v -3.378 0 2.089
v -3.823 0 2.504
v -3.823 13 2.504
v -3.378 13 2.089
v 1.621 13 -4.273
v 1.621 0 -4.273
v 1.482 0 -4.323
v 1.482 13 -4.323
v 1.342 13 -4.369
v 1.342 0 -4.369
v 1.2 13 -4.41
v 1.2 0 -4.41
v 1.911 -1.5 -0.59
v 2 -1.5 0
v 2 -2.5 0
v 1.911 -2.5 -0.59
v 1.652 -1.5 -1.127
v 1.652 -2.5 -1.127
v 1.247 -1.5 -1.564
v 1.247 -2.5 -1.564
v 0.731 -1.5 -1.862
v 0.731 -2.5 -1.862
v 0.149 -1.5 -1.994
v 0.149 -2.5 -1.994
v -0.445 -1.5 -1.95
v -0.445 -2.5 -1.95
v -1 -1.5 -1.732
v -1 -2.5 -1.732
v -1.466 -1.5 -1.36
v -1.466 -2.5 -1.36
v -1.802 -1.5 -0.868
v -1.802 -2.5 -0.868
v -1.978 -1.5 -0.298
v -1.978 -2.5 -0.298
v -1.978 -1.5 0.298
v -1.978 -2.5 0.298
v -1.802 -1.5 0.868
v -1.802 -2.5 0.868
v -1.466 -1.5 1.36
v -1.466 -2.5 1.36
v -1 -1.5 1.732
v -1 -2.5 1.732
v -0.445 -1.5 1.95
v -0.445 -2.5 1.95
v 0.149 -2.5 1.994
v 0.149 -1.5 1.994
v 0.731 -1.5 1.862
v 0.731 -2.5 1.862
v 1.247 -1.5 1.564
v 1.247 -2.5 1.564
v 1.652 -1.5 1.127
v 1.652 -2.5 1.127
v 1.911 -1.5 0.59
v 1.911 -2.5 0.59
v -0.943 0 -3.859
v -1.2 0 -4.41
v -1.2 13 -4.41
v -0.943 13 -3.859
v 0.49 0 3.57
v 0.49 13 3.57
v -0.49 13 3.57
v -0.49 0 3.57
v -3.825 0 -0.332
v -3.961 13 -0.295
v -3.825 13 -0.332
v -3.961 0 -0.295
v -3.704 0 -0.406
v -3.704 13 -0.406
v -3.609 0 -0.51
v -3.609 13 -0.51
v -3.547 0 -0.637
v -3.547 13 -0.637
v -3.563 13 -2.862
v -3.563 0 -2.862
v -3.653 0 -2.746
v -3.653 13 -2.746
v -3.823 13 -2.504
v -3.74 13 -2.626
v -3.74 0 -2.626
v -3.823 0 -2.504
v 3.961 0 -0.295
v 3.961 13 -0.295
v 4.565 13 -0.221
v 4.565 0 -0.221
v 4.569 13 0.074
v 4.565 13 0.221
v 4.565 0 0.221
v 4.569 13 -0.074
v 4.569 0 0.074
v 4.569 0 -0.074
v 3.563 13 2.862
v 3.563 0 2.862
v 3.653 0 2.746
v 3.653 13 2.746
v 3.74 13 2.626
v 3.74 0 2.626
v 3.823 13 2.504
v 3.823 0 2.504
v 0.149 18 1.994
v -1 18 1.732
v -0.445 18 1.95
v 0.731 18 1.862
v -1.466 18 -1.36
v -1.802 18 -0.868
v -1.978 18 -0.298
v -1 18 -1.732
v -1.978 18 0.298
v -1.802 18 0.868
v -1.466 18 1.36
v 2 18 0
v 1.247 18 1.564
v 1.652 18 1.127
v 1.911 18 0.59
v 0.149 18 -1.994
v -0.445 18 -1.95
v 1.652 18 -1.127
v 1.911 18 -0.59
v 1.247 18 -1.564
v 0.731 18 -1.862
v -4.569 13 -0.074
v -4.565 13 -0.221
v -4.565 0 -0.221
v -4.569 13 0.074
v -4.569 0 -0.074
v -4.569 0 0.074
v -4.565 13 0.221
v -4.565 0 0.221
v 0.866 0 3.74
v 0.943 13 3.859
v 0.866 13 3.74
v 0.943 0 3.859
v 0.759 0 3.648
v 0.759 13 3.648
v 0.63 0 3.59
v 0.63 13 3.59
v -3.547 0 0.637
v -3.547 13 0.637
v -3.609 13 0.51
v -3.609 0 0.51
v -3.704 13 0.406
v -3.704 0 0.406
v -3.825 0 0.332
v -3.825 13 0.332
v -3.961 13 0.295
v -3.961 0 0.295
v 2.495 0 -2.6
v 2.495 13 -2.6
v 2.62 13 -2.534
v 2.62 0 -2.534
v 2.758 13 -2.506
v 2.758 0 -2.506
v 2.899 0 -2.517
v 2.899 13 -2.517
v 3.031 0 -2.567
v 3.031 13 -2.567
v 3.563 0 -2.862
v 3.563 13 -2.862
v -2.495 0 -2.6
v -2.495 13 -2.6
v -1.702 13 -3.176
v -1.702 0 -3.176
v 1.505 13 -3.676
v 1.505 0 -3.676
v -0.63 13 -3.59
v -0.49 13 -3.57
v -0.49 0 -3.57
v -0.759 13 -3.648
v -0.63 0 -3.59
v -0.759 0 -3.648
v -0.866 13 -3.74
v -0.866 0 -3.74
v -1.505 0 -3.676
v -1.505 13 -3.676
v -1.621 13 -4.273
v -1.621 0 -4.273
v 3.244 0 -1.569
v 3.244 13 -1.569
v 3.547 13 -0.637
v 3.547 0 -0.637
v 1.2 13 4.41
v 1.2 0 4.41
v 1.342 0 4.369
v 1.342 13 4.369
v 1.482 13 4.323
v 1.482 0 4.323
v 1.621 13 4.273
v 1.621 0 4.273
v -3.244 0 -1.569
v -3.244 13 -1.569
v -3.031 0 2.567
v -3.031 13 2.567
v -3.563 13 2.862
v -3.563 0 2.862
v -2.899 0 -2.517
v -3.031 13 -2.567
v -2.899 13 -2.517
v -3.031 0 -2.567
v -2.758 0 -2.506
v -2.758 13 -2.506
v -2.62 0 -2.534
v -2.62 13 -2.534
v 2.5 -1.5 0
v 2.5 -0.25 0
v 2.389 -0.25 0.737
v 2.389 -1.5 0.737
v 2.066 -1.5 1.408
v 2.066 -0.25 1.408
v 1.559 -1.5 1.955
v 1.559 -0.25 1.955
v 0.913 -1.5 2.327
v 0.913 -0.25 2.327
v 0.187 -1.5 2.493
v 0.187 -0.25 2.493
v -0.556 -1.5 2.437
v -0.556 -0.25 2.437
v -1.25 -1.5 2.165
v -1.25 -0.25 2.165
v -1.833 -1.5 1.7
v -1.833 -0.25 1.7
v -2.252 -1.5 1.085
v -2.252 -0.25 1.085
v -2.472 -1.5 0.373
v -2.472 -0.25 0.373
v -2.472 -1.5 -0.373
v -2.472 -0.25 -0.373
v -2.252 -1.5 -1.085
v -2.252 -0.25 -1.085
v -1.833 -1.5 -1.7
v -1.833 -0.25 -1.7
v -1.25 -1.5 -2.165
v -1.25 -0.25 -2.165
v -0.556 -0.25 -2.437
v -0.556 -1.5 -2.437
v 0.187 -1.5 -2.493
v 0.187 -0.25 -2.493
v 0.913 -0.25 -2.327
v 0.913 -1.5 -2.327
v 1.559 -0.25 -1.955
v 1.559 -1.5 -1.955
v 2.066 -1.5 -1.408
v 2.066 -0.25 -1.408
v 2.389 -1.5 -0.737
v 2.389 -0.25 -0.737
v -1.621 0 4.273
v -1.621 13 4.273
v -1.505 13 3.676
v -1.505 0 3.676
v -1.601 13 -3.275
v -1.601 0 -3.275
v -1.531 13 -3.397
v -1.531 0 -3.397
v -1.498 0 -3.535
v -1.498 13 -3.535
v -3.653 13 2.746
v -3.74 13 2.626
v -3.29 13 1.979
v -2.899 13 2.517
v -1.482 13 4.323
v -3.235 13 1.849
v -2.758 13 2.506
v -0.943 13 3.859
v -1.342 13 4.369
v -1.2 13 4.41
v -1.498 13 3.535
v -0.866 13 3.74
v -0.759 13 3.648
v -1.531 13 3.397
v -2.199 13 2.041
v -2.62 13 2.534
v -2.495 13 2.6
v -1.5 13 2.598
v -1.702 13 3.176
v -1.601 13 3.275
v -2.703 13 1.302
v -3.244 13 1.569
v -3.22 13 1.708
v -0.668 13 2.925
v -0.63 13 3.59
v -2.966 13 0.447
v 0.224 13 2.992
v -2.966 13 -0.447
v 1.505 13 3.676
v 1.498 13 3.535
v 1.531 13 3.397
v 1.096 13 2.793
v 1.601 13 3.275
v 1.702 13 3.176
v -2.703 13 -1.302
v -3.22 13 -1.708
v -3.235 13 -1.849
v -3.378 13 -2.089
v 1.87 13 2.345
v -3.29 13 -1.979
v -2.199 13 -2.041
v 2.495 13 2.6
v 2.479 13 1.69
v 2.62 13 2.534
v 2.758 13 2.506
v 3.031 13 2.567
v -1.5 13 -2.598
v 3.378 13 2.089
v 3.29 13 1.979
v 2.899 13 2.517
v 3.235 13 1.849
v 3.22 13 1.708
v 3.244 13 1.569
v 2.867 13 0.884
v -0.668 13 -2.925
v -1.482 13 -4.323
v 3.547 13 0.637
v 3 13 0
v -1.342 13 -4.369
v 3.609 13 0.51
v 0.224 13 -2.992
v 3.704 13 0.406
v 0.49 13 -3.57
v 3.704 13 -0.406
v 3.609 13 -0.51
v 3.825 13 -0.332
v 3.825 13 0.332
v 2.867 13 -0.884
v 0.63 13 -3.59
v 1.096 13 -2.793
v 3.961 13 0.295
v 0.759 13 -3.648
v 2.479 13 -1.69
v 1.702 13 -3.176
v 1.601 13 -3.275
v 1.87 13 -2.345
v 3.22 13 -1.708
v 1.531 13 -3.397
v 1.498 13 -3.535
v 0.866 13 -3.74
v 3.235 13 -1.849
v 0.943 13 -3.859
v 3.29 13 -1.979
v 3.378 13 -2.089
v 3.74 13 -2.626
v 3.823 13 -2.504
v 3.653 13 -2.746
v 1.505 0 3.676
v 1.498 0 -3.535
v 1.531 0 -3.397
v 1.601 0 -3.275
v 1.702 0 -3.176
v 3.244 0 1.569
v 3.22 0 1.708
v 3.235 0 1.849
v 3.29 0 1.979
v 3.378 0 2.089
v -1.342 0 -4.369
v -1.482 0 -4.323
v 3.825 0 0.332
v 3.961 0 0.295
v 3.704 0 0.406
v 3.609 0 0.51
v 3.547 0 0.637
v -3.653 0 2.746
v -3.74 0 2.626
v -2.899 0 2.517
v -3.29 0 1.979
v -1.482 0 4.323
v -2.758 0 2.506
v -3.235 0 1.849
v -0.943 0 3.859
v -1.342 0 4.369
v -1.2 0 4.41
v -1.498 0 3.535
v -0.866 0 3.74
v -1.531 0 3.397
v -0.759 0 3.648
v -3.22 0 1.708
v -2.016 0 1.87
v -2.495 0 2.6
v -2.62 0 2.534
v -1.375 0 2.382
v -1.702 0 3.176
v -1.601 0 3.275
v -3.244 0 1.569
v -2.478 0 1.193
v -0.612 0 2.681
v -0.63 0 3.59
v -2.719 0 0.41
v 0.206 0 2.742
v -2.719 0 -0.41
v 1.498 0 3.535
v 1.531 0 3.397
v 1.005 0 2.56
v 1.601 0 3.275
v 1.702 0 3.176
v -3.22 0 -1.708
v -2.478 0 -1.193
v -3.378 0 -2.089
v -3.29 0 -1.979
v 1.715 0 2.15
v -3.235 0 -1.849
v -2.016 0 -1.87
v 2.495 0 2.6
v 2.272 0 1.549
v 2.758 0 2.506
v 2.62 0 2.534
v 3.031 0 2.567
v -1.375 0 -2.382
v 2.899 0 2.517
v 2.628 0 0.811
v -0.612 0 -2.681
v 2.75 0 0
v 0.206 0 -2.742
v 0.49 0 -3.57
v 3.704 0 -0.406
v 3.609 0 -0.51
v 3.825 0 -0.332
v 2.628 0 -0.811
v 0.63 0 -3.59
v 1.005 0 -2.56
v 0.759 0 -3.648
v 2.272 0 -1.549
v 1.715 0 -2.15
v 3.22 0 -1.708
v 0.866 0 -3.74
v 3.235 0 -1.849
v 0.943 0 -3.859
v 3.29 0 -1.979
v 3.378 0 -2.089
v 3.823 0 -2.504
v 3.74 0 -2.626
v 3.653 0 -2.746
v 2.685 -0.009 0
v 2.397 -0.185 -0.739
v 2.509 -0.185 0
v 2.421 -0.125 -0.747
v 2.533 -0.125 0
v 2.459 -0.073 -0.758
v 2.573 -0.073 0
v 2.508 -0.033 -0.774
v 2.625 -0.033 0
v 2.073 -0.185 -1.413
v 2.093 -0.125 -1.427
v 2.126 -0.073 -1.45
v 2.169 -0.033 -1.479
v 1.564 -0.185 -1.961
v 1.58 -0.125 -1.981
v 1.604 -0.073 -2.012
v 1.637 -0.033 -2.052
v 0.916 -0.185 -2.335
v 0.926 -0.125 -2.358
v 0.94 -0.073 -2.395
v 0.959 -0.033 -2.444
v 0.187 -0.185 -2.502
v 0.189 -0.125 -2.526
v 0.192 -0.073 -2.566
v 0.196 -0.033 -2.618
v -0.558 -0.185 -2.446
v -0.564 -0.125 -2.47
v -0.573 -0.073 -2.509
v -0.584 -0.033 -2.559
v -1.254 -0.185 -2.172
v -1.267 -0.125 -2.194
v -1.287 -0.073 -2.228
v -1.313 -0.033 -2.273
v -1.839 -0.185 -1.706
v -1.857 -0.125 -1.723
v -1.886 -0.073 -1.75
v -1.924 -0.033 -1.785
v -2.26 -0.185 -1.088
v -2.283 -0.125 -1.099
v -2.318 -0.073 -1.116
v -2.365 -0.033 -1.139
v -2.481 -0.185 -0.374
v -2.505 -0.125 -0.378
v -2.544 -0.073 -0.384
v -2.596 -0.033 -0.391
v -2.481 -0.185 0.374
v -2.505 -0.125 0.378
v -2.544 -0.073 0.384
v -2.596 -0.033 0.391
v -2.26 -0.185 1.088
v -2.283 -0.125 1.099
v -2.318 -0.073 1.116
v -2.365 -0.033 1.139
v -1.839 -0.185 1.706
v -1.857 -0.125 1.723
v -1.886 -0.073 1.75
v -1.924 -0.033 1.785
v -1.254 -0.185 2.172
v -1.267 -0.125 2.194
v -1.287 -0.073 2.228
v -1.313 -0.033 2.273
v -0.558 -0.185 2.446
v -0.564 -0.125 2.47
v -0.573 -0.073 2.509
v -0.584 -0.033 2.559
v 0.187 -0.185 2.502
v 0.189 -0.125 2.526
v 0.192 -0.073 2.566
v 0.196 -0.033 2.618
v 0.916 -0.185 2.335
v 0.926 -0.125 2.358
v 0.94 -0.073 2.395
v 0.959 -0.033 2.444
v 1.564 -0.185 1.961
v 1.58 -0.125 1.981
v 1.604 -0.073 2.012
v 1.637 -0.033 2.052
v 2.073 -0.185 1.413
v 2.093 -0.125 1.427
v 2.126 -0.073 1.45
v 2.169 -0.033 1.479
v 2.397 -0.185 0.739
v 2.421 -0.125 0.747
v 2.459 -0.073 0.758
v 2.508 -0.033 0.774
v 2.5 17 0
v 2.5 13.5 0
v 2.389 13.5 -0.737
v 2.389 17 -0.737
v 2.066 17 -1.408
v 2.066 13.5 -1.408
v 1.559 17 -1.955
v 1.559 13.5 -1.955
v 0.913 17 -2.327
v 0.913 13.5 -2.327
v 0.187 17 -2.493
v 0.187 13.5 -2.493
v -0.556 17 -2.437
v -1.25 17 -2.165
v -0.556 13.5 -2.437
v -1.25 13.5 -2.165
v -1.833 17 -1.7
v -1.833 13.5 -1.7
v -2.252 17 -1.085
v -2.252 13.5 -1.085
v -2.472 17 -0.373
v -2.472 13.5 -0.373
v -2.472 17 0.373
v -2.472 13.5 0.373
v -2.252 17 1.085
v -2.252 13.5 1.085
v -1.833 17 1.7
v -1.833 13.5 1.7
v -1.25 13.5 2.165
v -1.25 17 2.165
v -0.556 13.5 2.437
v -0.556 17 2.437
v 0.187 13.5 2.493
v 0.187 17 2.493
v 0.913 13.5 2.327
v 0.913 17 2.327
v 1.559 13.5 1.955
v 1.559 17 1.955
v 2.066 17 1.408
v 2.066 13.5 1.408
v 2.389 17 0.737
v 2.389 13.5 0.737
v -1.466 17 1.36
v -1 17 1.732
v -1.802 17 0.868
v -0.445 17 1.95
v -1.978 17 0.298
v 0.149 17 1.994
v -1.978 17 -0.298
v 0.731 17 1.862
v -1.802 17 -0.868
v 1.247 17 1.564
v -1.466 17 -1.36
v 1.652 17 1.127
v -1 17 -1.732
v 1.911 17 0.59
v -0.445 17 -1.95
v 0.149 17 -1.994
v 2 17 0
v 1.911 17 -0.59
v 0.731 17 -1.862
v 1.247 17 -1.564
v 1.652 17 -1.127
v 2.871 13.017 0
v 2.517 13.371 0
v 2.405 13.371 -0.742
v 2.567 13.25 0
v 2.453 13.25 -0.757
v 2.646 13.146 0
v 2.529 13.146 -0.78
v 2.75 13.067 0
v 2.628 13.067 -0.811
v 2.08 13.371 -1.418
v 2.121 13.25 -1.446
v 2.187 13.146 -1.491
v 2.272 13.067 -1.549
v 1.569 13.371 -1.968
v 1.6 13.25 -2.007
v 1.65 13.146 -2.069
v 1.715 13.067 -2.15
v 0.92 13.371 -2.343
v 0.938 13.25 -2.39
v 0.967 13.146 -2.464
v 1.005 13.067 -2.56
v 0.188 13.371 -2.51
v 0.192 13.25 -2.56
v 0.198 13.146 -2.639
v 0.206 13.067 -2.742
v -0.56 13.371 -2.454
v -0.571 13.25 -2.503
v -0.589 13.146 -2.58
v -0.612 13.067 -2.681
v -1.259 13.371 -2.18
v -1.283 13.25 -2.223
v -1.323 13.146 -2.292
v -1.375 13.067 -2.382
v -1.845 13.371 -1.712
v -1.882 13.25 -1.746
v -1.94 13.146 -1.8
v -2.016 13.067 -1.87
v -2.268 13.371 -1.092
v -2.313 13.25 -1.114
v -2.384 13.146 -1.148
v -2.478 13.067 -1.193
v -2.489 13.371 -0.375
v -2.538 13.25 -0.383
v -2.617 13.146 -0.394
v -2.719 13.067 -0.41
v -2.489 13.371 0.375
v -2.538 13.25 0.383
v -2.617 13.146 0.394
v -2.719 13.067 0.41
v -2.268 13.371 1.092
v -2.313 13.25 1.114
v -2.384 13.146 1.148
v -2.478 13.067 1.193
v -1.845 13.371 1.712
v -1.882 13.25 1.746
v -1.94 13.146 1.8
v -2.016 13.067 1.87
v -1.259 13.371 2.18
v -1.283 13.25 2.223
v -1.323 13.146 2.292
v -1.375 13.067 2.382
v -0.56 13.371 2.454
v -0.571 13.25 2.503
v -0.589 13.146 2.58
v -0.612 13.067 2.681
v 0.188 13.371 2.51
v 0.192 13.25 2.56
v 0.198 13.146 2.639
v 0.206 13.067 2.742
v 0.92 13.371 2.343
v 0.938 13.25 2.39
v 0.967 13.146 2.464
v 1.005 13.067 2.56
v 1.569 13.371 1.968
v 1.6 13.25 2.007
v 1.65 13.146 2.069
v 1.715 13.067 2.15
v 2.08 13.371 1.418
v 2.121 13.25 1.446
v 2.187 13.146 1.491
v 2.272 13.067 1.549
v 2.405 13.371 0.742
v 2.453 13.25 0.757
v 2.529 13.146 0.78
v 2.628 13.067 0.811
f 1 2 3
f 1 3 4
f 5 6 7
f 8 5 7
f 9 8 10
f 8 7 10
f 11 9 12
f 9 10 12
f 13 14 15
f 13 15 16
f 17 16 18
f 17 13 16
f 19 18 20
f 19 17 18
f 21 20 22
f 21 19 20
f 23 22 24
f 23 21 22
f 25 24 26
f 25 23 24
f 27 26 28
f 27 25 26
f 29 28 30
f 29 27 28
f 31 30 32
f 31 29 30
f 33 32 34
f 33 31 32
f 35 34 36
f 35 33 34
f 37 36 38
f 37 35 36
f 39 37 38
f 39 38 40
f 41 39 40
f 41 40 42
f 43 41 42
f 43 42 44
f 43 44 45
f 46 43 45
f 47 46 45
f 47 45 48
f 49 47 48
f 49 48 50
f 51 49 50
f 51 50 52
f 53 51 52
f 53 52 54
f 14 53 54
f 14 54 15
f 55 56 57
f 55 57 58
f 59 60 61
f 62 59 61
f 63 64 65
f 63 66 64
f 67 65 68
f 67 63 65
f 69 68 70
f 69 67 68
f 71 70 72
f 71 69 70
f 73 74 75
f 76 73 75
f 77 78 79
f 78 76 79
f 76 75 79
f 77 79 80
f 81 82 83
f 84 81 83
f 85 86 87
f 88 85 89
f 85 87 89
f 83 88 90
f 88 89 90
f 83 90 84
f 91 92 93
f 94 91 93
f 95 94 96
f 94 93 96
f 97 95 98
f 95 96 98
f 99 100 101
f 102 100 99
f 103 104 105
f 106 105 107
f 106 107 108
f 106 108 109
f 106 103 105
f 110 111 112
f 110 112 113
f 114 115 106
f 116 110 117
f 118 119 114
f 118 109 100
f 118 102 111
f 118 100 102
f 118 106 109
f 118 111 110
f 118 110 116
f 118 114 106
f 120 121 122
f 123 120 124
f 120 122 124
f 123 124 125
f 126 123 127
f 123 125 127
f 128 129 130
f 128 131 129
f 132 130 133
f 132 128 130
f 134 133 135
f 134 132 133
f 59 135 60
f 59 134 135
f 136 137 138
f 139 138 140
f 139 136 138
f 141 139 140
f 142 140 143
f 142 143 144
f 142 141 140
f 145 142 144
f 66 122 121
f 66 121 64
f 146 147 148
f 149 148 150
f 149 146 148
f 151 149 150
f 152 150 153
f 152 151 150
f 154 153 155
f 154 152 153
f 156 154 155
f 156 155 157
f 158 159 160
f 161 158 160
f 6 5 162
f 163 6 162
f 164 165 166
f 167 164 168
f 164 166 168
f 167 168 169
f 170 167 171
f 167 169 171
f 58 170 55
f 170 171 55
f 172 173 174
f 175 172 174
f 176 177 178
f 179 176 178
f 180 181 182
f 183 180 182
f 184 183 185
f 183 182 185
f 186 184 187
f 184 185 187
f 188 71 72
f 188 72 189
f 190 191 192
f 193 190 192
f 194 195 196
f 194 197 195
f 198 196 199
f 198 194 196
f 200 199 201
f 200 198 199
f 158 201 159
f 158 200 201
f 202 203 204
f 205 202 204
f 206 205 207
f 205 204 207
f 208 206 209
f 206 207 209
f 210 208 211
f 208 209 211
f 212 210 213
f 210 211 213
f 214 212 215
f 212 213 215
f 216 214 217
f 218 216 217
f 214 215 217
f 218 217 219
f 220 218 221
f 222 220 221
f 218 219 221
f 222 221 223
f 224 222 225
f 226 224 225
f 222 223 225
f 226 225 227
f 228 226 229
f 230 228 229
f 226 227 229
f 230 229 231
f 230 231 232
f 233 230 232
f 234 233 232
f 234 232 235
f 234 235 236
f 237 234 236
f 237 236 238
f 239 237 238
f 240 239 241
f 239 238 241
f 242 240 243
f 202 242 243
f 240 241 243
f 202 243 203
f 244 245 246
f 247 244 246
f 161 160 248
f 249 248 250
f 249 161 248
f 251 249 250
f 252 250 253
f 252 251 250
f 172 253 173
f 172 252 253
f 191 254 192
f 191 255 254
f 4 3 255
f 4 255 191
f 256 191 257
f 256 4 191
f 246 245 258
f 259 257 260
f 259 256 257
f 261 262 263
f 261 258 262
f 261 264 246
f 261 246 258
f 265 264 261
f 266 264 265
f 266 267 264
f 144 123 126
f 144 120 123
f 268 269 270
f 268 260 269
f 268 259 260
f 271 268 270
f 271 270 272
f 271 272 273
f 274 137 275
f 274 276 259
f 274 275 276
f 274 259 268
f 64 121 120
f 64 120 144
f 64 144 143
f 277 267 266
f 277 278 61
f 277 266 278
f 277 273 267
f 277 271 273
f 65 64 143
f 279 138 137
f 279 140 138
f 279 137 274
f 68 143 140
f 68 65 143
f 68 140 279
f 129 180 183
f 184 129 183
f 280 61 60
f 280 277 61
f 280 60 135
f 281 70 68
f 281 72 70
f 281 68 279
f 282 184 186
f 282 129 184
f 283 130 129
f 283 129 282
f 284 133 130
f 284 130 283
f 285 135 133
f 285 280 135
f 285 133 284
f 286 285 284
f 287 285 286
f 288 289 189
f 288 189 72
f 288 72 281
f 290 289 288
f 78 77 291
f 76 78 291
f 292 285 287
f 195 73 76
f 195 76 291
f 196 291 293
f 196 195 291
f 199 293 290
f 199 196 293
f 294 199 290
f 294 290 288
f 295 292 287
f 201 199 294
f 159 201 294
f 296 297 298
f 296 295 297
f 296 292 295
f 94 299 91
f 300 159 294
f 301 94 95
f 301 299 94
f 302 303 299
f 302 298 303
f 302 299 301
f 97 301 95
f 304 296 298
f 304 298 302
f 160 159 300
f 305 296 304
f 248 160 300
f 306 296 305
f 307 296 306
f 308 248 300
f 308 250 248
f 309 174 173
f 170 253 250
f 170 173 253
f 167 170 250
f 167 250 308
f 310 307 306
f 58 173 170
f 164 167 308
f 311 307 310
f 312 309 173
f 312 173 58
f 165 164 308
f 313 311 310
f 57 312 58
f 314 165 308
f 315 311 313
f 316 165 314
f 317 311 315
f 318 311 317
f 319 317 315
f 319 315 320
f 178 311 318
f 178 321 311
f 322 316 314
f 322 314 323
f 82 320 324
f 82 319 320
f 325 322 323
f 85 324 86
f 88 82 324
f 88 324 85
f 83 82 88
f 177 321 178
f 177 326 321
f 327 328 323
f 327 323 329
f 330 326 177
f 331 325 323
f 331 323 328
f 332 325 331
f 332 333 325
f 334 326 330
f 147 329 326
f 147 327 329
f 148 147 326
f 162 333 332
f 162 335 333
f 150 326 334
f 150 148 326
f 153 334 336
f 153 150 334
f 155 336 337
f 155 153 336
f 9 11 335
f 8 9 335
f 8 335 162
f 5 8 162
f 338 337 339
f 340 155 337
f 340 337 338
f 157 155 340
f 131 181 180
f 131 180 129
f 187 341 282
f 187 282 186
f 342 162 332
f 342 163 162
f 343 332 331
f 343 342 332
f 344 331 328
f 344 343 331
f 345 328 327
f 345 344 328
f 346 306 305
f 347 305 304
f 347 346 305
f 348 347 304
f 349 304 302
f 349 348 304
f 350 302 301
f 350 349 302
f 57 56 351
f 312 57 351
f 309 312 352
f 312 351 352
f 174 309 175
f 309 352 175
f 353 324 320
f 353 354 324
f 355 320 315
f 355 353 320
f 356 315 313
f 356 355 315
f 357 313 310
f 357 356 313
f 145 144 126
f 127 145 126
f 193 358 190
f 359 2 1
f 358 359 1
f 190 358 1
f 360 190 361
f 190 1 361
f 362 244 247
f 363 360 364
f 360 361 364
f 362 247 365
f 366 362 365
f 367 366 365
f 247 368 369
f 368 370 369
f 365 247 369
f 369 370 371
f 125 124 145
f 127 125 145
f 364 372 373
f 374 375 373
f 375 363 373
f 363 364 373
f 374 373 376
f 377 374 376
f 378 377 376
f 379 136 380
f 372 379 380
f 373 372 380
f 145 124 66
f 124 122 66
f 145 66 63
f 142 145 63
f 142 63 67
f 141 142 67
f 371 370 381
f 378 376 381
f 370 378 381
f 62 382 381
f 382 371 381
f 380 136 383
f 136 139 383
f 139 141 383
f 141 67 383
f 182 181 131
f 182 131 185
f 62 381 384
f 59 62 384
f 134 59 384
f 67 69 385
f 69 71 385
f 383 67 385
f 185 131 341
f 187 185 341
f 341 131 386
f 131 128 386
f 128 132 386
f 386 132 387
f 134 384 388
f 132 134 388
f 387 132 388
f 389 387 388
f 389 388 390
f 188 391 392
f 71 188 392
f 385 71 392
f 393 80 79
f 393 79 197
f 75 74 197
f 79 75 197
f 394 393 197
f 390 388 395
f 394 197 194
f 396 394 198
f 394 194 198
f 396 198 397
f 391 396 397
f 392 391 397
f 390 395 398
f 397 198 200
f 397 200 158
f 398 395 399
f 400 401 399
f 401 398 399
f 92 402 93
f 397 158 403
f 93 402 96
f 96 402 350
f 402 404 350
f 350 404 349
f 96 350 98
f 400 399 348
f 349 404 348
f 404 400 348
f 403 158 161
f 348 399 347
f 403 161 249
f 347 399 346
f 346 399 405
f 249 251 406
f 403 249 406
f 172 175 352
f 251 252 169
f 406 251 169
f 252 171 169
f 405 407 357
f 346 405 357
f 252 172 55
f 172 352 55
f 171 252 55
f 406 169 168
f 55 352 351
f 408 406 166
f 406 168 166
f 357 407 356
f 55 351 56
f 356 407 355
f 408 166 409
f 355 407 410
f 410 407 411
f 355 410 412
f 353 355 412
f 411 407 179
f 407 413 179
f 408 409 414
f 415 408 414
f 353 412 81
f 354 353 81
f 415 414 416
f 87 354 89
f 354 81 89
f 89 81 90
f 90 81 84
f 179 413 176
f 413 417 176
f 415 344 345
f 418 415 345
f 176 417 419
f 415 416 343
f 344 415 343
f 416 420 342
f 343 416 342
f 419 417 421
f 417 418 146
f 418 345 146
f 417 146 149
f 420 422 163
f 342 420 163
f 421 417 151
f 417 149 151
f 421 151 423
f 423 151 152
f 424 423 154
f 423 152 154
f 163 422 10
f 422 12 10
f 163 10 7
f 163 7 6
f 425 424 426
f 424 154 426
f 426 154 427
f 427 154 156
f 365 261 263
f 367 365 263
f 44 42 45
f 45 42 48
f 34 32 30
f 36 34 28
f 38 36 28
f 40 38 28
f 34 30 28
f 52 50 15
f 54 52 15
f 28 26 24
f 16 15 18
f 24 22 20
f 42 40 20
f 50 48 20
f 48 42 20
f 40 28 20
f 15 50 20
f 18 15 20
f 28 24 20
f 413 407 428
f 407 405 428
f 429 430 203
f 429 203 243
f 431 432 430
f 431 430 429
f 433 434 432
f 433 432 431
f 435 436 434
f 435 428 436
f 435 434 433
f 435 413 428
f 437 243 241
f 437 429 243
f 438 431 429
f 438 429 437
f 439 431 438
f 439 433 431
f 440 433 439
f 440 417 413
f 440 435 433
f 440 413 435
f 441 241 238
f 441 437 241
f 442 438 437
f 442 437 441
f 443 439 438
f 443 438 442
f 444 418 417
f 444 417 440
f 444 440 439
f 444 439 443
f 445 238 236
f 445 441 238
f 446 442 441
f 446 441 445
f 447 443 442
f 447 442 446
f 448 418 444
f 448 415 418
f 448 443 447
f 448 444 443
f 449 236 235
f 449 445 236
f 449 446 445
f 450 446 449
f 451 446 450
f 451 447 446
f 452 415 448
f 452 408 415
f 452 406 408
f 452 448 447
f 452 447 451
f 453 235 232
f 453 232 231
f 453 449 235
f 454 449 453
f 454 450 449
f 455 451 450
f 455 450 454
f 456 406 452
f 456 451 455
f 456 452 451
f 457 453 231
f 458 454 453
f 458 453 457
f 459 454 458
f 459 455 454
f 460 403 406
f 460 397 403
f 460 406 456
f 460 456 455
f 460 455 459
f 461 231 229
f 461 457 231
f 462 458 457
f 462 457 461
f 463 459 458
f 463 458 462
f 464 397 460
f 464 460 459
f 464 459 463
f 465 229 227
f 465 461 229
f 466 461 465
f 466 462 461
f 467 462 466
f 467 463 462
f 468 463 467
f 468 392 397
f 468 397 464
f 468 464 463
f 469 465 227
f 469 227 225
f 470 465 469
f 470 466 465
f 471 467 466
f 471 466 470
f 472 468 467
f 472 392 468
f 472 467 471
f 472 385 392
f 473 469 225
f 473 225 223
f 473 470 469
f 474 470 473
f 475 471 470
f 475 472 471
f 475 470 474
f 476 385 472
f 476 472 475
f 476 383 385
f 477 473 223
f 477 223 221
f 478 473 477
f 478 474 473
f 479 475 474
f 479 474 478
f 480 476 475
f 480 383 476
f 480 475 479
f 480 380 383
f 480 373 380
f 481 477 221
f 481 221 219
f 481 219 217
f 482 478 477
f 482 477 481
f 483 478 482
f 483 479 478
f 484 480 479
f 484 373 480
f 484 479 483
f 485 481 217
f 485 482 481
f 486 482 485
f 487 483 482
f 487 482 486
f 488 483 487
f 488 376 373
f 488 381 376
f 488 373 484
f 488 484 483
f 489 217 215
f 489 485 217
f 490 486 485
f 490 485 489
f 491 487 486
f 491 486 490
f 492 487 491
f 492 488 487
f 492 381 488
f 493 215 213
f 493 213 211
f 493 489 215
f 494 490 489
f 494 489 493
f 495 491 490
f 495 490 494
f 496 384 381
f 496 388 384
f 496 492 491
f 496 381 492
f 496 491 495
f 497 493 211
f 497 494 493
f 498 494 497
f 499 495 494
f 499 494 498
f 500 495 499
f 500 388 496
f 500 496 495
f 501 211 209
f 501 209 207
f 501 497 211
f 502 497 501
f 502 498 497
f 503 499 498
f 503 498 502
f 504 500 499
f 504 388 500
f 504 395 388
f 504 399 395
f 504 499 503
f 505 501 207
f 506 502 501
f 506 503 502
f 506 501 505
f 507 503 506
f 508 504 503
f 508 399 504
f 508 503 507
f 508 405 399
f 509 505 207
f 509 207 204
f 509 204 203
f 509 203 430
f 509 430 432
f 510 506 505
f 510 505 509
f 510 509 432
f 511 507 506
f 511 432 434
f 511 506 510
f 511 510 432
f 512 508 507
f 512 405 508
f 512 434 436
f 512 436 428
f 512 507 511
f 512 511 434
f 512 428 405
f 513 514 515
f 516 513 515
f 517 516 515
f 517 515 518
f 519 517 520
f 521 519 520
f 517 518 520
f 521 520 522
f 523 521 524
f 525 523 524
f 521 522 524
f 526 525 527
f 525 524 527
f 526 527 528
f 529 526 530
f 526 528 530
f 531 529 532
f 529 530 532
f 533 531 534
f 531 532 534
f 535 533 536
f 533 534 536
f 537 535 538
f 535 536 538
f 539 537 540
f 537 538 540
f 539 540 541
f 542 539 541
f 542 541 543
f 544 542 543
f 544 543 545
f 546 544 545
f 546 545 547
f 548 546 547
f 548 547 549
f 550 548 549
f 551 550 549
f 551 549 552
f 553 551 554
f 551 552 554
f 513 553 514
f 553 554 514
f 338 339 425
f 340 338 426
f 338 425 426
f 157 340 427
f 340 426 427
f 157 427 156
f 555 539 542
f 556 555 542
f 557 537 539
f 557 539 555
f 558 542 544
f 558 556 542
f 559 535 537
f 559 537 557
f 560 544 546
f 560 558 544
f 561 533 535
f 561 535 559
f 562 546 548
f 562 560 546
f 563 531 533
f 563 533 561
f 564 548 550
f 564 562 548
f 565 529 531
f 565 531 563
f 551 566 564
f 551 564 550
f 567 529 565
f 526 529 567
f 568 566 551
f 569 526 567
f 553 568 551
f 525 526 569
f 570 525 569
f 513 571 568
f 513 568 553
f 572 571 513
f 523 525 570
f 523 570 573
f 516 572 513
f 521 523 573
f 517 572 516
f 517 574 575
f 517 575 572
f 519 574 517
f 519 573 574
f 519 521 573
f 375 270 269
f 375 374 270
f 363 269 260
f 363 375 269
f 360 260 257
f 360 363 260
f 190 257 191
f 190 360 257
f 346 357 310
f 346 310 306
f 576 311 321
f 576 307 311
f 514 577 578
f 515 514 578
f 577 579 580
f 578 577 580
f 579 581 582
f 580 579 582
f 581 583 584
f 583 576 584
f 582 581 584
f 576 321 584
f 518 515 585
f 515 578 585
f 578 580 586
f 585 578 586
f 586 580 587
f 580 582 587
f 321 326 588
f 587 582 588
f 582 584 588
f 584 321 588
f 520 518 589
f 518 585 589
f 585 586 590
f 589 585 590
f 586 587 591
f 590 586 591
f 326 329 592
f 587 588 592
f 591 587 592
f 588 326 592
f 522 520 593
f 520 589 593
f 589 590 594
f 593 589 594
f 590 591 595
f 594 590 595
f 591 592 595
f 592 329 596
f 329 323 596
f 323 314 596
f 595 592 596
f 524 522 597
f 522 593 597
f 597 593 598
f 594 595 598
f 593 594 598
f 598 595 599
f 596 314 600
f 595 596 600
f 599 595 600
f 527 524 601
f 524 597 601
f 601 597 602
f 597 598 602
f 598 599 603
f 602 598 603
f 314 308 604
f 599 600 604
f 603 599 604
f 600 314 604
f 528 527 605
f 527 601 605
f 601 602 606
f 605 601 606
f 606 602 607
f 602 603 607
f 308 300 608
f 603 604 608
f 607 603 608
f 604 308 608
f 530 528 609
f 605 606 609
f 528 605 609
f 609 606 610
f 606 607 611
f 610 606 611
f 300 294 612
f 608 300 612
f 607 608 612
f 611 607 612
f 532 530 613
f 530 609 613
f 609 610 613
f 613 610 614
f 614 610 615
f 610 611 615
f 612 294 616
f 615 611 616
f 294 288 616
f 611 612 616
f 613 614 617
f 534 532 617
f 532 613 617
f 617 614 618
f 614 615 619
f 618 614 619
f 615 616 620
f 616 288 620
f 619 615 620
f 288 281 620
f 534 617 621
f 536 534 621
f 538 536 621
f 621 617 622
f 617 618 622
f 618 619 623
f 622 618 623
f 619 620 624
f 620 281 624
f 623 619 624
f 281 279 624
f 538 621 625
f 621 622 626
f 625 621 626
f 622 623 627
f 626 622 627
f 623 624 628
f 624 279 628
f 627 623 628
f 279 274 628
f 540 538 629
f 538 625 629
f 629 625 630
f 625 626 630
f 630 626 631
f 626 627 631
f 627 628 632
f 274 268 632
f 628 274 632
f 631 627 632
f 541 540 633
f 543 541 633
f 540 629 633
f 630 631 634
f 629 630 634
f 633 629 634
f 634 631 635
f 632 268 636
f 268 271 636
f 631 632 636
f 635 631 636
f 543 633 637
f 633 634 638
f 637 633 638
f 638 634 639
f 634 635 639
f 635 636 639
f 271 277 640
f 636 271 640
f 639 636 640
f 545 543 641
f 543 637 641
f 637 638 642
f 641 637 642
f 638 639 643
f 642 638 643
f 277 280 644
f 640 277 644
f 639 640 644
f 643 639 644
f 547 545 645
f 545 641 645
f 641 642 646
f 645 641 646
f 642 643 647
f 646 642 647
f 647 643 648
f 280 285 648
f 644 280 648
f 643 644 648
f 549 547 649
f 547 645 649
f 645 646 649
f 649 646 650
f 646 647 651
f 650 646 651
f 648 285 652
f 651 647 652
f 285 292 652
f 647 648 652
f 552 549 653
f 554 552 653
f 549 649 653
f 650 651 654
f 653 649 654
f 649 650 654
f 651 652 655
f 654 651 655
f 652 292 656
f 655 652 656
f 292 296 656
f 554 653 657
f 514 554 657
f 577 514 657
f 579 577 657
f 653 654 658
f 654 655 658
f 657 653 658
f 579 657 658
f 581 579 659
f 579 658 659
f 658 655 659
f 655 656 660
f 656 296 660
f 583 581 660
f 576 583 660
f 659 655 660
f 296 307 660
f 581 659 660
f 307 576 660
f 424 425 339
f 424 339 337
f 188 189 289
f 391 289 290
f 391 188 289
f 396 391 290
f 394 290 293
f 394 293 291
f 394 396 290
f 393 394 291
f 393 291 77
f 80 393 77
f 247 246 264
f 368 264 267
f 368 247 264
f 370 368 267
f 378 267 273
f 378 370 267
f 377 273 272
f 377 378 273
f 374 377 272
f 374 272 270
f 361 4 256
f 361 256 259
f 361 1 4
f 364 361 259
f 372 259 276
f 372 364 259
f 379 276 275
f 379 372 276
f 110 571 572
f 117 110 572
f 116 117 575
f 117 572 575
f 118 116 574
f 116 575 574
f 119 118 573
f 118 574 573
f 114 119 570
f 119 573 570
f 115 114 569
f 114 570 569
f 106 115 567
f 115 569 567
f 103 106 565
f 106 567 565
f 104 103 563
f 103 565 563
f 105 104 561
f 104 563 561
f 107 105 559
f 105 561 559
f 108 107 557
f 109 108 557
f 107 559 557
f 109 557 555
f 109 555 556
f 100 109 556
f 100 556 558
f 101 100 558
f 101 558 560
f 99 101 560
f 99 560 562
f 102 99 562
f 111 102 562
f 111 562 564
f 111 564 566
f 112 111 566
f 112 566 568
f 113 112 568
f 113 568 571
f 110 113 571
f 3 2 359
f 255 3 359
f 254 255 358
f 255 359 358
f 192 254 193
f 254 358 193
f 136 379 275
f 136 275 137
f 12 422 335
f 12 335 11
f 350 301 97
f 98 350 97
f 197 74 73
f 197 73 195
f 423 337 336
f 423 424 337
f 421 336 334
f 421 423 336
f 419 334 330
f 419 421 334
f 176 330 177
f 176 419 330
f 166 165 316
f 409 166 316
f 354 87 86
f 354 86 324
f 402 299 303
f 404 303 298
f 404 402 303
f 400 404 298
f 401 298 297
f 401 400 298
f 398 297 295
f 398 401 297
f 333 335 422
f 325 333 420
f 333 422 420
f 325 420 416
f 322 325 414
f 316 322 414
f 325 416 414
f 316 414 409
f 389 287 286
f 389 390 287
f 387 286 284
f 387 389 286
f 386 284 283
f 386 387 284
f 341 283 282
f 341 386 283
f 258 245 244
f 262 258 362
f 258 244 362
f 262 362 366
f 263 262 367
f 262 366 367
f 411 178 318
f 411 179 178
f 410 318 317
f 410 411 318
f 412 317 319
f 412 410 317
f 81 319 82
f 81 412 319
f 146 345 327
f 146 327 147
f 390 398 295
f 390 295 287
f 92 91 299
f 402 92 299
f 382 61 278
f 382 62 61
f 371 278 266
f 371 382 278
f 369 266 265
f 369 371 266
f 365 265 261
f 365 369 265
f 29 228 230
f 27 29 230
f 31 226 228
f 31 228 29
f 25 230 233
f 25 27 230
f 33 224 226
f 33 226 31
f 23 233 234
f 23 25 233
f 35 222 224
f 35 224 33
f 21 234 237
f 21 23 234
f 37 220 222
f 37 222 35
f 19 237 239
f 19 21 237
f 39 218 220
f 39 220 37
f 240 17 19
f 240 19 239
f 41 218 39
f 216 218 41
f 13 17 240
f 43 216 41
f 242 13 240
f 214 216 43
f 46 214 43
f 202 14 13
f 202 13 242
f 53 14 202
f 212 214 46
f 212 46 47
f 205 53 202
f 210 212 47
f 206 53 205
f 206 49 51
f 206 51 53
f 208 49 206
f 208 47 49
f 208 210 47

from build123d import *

# Parameters (mm, degrees)
SKIZZE1_R                       = 4.57
SKIZZE1_R_2                     = 2
AUFSATZ_LINEAR_AUSTRAGEN1_DEPTH = 13
SCHNITT_LINEAR_AUSTRAGEN1_DEPTH = 14
VERRUNDUNG1_R                   = 0.5
KREISMUSTER1_COUNT              = 10
VERRUNDUNG1_OF_KREISMUSTER1_R   = 0.5
FASE2_SIZE                      = 0.2
BOSS_EXTRUDE1_DEPTH             = 6.3
BOSS_EXTRUDE1_DEPTH_BACK        = 6.3
SKETCH2_R                       = 2.2
BOSS_EXTRUDE4_DEPTH             = 13
SKETCH3_R                       = 2
BOSS_EXTRUDE6_DEPTH             = 5
BOSS_EXTRUDE6_DEPTH_BACK        = 15.5
FILLET2_R                       = 0.5
SKETCH4_R                       = 2.5
SKETCH4_R_2                     = 1.5
BOSS_EXTRUDE7_DEPTH             = 1.5
FILLET3_R                       = 0.25
SKETCH5_R                       = 2.5
SKETCH5_R_2                     = 1.5
BOSS_EXTRUDE8_DEPTH             = 4
FILLET4_R                       = 0.5


with BuildPart() as part:
    # Skizze1 → Aufsatz-Linear austragen1 (new body)
    with BuildSketch(Plane(origin=(0, 0, 0), x_dir=(1, 0, 0), z_dir=(0, 1, 0))):
        Circle(SKIZZE1_R)
        Circle(SKIZZE1_R_2, mode=Mode.SUBTRACT)
    extrude(amount=AUFSATZ_LINEAR_AUSTRAGEN1_DEPTH)

    # Skizze12 → Schnitt-Linear austragen1 (cut, through all)
    with BuildSketch(Plane(origin=(0, 13, 0), x_dir=(1, 0, 0), z_dir=(0, 1, 0))):
        with BuildLine():
            Line((-1.2, 4.409637173), (-0.808470756, 3.57))
            Line((-0.808470756, 3.57), (0.808470756, 3.57))
            Line((0.808470756, 3.57), (1.2, 4.409637173))
            ThreePointArc((1.2, 4.409637173), (0, 4.57), (-1.2, 4.409637173))
        make_face()
    schnitt_linear_austragen1 = extrude(amount=-SCHNITT_LINEAR_AUSTRAGEN1_DEPTH, mode=Mode.SUBTRACT)

    # Verrundung1
    verrundung1_edges = [part.edges().sort_by_distance(p)[0] for p in [
        (0.808470756, 6.5, -3.57),
        (-0.808470756, 6.5, -3.57),
    ]]
    fillet(verrundung1_edges, radius=VERRUNDUNG1_R)

    # Kreismuster1: Schnitt-Linear austragen1 ×10 about axis
    kreismuster1_axis = Axis((0, 0, 0), (0, 1, 0))
    for i in range(1, KREISMUSTER1_COUNT):
        add(schnitt_linear_austragen1.rotate(kreismuster1_axis, i * 360 / KREISMUSTER1_COUNT), mode=Mode.SUBTRACT)

    # Verrundung1 of Kreismuster1
    verrundung1_of_kreismuster1_edges = [part.edges().sort_by_distance(p)[0] for p in [
        (-1.44432677, 6.5, -3.363397857),
        (-2.752459932, 6.5, -2.412983483),
        (-3.14544056, 6.5, -1.872092051),
        (-3.645102966, 6.5, -0.334289289),
        (-3.645102966, 6.5, 0.334289289),
        (-3.14544056, 6.5, 1.872092051),
        (-2.752459932, 6.5, 2.412983483),
        (-1.44432677, 6.5, 3.363397857),
        (-0.808470756, 6.5, 3.57),
        (0.808470756, 6.5, 3.57),
        (1.44432677, 6.5, 3.363397857),
        (2.752459932, 6.5, 2.412983483),
        (3.14544056, 6.5, 1.872092051),
        (3.645102966, 6.5, 0.334289289),
        (3.645102966, 6.5, -0.334289289),
        (3.14544056, 6.5, -1.872092051),
        (2.752459932, 6.5, -2.412983483),
        (1.44432677, 6.5, -3.363397857),
    ]]
    fillet(verrundung1_of_kreismuster1_edges, radius=VERRUNDUNG1_OF_KREISMUSTER1_R)

    # Fase2
    fase2_edges = [part.edges().sort_by_distance(p)[0] for p in [
        (-2, 0, 0),
        (-2, 13, 0),
    ]]
    chamfer(fase2_edges, length=FASE2_SIZE)

    # Sketch1 → Boss-Extrude1 (add, two sides)
    with BuildSketch(Plane(origin=(0, 6.5, 0), x_dir=(-1, 0, 0), z_dir=(0, -1, 0))) as boss_extrude1_sk:
        with BuildLine():
            Line((-1.4, 1.428285686), (-1.4, -1.428285686))
            ThreePointArc((-1.4, -1.428285686), (-2, 0), (-1.4, 1.428285686))
        make_face()
    extrude(amount=BOSS_EXTRUDE1_DEPTH)
    extrude(boss_extrude1_sk.sketch, amount=-BOSS_EXTRUDE1_DEPTH_BACK)



with BuildPart() as body_2:
    # Sketch2 → Boss-Extrude4 (new body)
    with BuildSketch(Plane(origin=(0, 13, 0), x_dir=(1, 0, 0), z_dir=(0, 1, 0))):
        Circle(SKETCH2_R)
    extrude(amount=-BOSS_EXTRUDE4_DEPTH)


with BuildPart() as part_1:
    add(part.part)

    add(body_2.part)  # Boss-Extrude6 merges body 2
    # Sketch3 → Boss-Extrude6 (add, two sides)
    with BuildSketch(Plane(origin=(0, 13, 0), x_dir=(1, 0, 0), z_dir=(0, 1, 0))) as boss_extrude6_sk:
        Circle(SKETCH3_R)
    extrude(amount=BOSS_EXTRUDE6_DEPTH)
    extrude(boss_extrude6_sk.sketch, amount=-BOSS_EXTRUDE6_DEPTH_BACK)

    # Fillet2
    fillet2_edges = [part_1.edges().sort_by_distance(p)[0] for p in [
        (-2, 13, 0),
        (-2, 0, 0),
    ]]
    fillet(fillet2_edges, radius=FILLET2_R)

    # Sketch4 → Boss-Extrude7 (add)
    with BuildSketch(Plane.XZ):
        Circle(SKETCH4_R)
        Circle(SKETCH4_R_2, mode=Mode.SUBTRACT)
    extrude(amount=BOSS_EXTRUDE7_DEPTH)

    # Fillet3
    fillet3_edges = [part_1.edges().sort_by_distance(p)[0] for p in [
        (-2.5, 0, 0),
    ]]
    fillet(fillet3_edges, radius=FILLET3_R)

    # Sketch5 → Boss-Extrude8 (add)
    with BuildSketch(Plane(origin=(0, 13, 0), x_dir=(1, 0, 0), z_dir=(0, 1, 0))):
        Circle(SKETCH5_R)
        Circle(SKETCH5_R_2, mode=Mode.SUBTRACT)
    extrude(amount=BOSS_EXTRUDE8_DEPTH)

    # Fillet4
    fillet4_edges = [part_1.edges().sort_by_distance(p)[0] for p in [
        (-2.5, 13, 0),
    ]]
    fillet(fillet4_edges, radius=FILLET4_R)


solid = part_1.part
